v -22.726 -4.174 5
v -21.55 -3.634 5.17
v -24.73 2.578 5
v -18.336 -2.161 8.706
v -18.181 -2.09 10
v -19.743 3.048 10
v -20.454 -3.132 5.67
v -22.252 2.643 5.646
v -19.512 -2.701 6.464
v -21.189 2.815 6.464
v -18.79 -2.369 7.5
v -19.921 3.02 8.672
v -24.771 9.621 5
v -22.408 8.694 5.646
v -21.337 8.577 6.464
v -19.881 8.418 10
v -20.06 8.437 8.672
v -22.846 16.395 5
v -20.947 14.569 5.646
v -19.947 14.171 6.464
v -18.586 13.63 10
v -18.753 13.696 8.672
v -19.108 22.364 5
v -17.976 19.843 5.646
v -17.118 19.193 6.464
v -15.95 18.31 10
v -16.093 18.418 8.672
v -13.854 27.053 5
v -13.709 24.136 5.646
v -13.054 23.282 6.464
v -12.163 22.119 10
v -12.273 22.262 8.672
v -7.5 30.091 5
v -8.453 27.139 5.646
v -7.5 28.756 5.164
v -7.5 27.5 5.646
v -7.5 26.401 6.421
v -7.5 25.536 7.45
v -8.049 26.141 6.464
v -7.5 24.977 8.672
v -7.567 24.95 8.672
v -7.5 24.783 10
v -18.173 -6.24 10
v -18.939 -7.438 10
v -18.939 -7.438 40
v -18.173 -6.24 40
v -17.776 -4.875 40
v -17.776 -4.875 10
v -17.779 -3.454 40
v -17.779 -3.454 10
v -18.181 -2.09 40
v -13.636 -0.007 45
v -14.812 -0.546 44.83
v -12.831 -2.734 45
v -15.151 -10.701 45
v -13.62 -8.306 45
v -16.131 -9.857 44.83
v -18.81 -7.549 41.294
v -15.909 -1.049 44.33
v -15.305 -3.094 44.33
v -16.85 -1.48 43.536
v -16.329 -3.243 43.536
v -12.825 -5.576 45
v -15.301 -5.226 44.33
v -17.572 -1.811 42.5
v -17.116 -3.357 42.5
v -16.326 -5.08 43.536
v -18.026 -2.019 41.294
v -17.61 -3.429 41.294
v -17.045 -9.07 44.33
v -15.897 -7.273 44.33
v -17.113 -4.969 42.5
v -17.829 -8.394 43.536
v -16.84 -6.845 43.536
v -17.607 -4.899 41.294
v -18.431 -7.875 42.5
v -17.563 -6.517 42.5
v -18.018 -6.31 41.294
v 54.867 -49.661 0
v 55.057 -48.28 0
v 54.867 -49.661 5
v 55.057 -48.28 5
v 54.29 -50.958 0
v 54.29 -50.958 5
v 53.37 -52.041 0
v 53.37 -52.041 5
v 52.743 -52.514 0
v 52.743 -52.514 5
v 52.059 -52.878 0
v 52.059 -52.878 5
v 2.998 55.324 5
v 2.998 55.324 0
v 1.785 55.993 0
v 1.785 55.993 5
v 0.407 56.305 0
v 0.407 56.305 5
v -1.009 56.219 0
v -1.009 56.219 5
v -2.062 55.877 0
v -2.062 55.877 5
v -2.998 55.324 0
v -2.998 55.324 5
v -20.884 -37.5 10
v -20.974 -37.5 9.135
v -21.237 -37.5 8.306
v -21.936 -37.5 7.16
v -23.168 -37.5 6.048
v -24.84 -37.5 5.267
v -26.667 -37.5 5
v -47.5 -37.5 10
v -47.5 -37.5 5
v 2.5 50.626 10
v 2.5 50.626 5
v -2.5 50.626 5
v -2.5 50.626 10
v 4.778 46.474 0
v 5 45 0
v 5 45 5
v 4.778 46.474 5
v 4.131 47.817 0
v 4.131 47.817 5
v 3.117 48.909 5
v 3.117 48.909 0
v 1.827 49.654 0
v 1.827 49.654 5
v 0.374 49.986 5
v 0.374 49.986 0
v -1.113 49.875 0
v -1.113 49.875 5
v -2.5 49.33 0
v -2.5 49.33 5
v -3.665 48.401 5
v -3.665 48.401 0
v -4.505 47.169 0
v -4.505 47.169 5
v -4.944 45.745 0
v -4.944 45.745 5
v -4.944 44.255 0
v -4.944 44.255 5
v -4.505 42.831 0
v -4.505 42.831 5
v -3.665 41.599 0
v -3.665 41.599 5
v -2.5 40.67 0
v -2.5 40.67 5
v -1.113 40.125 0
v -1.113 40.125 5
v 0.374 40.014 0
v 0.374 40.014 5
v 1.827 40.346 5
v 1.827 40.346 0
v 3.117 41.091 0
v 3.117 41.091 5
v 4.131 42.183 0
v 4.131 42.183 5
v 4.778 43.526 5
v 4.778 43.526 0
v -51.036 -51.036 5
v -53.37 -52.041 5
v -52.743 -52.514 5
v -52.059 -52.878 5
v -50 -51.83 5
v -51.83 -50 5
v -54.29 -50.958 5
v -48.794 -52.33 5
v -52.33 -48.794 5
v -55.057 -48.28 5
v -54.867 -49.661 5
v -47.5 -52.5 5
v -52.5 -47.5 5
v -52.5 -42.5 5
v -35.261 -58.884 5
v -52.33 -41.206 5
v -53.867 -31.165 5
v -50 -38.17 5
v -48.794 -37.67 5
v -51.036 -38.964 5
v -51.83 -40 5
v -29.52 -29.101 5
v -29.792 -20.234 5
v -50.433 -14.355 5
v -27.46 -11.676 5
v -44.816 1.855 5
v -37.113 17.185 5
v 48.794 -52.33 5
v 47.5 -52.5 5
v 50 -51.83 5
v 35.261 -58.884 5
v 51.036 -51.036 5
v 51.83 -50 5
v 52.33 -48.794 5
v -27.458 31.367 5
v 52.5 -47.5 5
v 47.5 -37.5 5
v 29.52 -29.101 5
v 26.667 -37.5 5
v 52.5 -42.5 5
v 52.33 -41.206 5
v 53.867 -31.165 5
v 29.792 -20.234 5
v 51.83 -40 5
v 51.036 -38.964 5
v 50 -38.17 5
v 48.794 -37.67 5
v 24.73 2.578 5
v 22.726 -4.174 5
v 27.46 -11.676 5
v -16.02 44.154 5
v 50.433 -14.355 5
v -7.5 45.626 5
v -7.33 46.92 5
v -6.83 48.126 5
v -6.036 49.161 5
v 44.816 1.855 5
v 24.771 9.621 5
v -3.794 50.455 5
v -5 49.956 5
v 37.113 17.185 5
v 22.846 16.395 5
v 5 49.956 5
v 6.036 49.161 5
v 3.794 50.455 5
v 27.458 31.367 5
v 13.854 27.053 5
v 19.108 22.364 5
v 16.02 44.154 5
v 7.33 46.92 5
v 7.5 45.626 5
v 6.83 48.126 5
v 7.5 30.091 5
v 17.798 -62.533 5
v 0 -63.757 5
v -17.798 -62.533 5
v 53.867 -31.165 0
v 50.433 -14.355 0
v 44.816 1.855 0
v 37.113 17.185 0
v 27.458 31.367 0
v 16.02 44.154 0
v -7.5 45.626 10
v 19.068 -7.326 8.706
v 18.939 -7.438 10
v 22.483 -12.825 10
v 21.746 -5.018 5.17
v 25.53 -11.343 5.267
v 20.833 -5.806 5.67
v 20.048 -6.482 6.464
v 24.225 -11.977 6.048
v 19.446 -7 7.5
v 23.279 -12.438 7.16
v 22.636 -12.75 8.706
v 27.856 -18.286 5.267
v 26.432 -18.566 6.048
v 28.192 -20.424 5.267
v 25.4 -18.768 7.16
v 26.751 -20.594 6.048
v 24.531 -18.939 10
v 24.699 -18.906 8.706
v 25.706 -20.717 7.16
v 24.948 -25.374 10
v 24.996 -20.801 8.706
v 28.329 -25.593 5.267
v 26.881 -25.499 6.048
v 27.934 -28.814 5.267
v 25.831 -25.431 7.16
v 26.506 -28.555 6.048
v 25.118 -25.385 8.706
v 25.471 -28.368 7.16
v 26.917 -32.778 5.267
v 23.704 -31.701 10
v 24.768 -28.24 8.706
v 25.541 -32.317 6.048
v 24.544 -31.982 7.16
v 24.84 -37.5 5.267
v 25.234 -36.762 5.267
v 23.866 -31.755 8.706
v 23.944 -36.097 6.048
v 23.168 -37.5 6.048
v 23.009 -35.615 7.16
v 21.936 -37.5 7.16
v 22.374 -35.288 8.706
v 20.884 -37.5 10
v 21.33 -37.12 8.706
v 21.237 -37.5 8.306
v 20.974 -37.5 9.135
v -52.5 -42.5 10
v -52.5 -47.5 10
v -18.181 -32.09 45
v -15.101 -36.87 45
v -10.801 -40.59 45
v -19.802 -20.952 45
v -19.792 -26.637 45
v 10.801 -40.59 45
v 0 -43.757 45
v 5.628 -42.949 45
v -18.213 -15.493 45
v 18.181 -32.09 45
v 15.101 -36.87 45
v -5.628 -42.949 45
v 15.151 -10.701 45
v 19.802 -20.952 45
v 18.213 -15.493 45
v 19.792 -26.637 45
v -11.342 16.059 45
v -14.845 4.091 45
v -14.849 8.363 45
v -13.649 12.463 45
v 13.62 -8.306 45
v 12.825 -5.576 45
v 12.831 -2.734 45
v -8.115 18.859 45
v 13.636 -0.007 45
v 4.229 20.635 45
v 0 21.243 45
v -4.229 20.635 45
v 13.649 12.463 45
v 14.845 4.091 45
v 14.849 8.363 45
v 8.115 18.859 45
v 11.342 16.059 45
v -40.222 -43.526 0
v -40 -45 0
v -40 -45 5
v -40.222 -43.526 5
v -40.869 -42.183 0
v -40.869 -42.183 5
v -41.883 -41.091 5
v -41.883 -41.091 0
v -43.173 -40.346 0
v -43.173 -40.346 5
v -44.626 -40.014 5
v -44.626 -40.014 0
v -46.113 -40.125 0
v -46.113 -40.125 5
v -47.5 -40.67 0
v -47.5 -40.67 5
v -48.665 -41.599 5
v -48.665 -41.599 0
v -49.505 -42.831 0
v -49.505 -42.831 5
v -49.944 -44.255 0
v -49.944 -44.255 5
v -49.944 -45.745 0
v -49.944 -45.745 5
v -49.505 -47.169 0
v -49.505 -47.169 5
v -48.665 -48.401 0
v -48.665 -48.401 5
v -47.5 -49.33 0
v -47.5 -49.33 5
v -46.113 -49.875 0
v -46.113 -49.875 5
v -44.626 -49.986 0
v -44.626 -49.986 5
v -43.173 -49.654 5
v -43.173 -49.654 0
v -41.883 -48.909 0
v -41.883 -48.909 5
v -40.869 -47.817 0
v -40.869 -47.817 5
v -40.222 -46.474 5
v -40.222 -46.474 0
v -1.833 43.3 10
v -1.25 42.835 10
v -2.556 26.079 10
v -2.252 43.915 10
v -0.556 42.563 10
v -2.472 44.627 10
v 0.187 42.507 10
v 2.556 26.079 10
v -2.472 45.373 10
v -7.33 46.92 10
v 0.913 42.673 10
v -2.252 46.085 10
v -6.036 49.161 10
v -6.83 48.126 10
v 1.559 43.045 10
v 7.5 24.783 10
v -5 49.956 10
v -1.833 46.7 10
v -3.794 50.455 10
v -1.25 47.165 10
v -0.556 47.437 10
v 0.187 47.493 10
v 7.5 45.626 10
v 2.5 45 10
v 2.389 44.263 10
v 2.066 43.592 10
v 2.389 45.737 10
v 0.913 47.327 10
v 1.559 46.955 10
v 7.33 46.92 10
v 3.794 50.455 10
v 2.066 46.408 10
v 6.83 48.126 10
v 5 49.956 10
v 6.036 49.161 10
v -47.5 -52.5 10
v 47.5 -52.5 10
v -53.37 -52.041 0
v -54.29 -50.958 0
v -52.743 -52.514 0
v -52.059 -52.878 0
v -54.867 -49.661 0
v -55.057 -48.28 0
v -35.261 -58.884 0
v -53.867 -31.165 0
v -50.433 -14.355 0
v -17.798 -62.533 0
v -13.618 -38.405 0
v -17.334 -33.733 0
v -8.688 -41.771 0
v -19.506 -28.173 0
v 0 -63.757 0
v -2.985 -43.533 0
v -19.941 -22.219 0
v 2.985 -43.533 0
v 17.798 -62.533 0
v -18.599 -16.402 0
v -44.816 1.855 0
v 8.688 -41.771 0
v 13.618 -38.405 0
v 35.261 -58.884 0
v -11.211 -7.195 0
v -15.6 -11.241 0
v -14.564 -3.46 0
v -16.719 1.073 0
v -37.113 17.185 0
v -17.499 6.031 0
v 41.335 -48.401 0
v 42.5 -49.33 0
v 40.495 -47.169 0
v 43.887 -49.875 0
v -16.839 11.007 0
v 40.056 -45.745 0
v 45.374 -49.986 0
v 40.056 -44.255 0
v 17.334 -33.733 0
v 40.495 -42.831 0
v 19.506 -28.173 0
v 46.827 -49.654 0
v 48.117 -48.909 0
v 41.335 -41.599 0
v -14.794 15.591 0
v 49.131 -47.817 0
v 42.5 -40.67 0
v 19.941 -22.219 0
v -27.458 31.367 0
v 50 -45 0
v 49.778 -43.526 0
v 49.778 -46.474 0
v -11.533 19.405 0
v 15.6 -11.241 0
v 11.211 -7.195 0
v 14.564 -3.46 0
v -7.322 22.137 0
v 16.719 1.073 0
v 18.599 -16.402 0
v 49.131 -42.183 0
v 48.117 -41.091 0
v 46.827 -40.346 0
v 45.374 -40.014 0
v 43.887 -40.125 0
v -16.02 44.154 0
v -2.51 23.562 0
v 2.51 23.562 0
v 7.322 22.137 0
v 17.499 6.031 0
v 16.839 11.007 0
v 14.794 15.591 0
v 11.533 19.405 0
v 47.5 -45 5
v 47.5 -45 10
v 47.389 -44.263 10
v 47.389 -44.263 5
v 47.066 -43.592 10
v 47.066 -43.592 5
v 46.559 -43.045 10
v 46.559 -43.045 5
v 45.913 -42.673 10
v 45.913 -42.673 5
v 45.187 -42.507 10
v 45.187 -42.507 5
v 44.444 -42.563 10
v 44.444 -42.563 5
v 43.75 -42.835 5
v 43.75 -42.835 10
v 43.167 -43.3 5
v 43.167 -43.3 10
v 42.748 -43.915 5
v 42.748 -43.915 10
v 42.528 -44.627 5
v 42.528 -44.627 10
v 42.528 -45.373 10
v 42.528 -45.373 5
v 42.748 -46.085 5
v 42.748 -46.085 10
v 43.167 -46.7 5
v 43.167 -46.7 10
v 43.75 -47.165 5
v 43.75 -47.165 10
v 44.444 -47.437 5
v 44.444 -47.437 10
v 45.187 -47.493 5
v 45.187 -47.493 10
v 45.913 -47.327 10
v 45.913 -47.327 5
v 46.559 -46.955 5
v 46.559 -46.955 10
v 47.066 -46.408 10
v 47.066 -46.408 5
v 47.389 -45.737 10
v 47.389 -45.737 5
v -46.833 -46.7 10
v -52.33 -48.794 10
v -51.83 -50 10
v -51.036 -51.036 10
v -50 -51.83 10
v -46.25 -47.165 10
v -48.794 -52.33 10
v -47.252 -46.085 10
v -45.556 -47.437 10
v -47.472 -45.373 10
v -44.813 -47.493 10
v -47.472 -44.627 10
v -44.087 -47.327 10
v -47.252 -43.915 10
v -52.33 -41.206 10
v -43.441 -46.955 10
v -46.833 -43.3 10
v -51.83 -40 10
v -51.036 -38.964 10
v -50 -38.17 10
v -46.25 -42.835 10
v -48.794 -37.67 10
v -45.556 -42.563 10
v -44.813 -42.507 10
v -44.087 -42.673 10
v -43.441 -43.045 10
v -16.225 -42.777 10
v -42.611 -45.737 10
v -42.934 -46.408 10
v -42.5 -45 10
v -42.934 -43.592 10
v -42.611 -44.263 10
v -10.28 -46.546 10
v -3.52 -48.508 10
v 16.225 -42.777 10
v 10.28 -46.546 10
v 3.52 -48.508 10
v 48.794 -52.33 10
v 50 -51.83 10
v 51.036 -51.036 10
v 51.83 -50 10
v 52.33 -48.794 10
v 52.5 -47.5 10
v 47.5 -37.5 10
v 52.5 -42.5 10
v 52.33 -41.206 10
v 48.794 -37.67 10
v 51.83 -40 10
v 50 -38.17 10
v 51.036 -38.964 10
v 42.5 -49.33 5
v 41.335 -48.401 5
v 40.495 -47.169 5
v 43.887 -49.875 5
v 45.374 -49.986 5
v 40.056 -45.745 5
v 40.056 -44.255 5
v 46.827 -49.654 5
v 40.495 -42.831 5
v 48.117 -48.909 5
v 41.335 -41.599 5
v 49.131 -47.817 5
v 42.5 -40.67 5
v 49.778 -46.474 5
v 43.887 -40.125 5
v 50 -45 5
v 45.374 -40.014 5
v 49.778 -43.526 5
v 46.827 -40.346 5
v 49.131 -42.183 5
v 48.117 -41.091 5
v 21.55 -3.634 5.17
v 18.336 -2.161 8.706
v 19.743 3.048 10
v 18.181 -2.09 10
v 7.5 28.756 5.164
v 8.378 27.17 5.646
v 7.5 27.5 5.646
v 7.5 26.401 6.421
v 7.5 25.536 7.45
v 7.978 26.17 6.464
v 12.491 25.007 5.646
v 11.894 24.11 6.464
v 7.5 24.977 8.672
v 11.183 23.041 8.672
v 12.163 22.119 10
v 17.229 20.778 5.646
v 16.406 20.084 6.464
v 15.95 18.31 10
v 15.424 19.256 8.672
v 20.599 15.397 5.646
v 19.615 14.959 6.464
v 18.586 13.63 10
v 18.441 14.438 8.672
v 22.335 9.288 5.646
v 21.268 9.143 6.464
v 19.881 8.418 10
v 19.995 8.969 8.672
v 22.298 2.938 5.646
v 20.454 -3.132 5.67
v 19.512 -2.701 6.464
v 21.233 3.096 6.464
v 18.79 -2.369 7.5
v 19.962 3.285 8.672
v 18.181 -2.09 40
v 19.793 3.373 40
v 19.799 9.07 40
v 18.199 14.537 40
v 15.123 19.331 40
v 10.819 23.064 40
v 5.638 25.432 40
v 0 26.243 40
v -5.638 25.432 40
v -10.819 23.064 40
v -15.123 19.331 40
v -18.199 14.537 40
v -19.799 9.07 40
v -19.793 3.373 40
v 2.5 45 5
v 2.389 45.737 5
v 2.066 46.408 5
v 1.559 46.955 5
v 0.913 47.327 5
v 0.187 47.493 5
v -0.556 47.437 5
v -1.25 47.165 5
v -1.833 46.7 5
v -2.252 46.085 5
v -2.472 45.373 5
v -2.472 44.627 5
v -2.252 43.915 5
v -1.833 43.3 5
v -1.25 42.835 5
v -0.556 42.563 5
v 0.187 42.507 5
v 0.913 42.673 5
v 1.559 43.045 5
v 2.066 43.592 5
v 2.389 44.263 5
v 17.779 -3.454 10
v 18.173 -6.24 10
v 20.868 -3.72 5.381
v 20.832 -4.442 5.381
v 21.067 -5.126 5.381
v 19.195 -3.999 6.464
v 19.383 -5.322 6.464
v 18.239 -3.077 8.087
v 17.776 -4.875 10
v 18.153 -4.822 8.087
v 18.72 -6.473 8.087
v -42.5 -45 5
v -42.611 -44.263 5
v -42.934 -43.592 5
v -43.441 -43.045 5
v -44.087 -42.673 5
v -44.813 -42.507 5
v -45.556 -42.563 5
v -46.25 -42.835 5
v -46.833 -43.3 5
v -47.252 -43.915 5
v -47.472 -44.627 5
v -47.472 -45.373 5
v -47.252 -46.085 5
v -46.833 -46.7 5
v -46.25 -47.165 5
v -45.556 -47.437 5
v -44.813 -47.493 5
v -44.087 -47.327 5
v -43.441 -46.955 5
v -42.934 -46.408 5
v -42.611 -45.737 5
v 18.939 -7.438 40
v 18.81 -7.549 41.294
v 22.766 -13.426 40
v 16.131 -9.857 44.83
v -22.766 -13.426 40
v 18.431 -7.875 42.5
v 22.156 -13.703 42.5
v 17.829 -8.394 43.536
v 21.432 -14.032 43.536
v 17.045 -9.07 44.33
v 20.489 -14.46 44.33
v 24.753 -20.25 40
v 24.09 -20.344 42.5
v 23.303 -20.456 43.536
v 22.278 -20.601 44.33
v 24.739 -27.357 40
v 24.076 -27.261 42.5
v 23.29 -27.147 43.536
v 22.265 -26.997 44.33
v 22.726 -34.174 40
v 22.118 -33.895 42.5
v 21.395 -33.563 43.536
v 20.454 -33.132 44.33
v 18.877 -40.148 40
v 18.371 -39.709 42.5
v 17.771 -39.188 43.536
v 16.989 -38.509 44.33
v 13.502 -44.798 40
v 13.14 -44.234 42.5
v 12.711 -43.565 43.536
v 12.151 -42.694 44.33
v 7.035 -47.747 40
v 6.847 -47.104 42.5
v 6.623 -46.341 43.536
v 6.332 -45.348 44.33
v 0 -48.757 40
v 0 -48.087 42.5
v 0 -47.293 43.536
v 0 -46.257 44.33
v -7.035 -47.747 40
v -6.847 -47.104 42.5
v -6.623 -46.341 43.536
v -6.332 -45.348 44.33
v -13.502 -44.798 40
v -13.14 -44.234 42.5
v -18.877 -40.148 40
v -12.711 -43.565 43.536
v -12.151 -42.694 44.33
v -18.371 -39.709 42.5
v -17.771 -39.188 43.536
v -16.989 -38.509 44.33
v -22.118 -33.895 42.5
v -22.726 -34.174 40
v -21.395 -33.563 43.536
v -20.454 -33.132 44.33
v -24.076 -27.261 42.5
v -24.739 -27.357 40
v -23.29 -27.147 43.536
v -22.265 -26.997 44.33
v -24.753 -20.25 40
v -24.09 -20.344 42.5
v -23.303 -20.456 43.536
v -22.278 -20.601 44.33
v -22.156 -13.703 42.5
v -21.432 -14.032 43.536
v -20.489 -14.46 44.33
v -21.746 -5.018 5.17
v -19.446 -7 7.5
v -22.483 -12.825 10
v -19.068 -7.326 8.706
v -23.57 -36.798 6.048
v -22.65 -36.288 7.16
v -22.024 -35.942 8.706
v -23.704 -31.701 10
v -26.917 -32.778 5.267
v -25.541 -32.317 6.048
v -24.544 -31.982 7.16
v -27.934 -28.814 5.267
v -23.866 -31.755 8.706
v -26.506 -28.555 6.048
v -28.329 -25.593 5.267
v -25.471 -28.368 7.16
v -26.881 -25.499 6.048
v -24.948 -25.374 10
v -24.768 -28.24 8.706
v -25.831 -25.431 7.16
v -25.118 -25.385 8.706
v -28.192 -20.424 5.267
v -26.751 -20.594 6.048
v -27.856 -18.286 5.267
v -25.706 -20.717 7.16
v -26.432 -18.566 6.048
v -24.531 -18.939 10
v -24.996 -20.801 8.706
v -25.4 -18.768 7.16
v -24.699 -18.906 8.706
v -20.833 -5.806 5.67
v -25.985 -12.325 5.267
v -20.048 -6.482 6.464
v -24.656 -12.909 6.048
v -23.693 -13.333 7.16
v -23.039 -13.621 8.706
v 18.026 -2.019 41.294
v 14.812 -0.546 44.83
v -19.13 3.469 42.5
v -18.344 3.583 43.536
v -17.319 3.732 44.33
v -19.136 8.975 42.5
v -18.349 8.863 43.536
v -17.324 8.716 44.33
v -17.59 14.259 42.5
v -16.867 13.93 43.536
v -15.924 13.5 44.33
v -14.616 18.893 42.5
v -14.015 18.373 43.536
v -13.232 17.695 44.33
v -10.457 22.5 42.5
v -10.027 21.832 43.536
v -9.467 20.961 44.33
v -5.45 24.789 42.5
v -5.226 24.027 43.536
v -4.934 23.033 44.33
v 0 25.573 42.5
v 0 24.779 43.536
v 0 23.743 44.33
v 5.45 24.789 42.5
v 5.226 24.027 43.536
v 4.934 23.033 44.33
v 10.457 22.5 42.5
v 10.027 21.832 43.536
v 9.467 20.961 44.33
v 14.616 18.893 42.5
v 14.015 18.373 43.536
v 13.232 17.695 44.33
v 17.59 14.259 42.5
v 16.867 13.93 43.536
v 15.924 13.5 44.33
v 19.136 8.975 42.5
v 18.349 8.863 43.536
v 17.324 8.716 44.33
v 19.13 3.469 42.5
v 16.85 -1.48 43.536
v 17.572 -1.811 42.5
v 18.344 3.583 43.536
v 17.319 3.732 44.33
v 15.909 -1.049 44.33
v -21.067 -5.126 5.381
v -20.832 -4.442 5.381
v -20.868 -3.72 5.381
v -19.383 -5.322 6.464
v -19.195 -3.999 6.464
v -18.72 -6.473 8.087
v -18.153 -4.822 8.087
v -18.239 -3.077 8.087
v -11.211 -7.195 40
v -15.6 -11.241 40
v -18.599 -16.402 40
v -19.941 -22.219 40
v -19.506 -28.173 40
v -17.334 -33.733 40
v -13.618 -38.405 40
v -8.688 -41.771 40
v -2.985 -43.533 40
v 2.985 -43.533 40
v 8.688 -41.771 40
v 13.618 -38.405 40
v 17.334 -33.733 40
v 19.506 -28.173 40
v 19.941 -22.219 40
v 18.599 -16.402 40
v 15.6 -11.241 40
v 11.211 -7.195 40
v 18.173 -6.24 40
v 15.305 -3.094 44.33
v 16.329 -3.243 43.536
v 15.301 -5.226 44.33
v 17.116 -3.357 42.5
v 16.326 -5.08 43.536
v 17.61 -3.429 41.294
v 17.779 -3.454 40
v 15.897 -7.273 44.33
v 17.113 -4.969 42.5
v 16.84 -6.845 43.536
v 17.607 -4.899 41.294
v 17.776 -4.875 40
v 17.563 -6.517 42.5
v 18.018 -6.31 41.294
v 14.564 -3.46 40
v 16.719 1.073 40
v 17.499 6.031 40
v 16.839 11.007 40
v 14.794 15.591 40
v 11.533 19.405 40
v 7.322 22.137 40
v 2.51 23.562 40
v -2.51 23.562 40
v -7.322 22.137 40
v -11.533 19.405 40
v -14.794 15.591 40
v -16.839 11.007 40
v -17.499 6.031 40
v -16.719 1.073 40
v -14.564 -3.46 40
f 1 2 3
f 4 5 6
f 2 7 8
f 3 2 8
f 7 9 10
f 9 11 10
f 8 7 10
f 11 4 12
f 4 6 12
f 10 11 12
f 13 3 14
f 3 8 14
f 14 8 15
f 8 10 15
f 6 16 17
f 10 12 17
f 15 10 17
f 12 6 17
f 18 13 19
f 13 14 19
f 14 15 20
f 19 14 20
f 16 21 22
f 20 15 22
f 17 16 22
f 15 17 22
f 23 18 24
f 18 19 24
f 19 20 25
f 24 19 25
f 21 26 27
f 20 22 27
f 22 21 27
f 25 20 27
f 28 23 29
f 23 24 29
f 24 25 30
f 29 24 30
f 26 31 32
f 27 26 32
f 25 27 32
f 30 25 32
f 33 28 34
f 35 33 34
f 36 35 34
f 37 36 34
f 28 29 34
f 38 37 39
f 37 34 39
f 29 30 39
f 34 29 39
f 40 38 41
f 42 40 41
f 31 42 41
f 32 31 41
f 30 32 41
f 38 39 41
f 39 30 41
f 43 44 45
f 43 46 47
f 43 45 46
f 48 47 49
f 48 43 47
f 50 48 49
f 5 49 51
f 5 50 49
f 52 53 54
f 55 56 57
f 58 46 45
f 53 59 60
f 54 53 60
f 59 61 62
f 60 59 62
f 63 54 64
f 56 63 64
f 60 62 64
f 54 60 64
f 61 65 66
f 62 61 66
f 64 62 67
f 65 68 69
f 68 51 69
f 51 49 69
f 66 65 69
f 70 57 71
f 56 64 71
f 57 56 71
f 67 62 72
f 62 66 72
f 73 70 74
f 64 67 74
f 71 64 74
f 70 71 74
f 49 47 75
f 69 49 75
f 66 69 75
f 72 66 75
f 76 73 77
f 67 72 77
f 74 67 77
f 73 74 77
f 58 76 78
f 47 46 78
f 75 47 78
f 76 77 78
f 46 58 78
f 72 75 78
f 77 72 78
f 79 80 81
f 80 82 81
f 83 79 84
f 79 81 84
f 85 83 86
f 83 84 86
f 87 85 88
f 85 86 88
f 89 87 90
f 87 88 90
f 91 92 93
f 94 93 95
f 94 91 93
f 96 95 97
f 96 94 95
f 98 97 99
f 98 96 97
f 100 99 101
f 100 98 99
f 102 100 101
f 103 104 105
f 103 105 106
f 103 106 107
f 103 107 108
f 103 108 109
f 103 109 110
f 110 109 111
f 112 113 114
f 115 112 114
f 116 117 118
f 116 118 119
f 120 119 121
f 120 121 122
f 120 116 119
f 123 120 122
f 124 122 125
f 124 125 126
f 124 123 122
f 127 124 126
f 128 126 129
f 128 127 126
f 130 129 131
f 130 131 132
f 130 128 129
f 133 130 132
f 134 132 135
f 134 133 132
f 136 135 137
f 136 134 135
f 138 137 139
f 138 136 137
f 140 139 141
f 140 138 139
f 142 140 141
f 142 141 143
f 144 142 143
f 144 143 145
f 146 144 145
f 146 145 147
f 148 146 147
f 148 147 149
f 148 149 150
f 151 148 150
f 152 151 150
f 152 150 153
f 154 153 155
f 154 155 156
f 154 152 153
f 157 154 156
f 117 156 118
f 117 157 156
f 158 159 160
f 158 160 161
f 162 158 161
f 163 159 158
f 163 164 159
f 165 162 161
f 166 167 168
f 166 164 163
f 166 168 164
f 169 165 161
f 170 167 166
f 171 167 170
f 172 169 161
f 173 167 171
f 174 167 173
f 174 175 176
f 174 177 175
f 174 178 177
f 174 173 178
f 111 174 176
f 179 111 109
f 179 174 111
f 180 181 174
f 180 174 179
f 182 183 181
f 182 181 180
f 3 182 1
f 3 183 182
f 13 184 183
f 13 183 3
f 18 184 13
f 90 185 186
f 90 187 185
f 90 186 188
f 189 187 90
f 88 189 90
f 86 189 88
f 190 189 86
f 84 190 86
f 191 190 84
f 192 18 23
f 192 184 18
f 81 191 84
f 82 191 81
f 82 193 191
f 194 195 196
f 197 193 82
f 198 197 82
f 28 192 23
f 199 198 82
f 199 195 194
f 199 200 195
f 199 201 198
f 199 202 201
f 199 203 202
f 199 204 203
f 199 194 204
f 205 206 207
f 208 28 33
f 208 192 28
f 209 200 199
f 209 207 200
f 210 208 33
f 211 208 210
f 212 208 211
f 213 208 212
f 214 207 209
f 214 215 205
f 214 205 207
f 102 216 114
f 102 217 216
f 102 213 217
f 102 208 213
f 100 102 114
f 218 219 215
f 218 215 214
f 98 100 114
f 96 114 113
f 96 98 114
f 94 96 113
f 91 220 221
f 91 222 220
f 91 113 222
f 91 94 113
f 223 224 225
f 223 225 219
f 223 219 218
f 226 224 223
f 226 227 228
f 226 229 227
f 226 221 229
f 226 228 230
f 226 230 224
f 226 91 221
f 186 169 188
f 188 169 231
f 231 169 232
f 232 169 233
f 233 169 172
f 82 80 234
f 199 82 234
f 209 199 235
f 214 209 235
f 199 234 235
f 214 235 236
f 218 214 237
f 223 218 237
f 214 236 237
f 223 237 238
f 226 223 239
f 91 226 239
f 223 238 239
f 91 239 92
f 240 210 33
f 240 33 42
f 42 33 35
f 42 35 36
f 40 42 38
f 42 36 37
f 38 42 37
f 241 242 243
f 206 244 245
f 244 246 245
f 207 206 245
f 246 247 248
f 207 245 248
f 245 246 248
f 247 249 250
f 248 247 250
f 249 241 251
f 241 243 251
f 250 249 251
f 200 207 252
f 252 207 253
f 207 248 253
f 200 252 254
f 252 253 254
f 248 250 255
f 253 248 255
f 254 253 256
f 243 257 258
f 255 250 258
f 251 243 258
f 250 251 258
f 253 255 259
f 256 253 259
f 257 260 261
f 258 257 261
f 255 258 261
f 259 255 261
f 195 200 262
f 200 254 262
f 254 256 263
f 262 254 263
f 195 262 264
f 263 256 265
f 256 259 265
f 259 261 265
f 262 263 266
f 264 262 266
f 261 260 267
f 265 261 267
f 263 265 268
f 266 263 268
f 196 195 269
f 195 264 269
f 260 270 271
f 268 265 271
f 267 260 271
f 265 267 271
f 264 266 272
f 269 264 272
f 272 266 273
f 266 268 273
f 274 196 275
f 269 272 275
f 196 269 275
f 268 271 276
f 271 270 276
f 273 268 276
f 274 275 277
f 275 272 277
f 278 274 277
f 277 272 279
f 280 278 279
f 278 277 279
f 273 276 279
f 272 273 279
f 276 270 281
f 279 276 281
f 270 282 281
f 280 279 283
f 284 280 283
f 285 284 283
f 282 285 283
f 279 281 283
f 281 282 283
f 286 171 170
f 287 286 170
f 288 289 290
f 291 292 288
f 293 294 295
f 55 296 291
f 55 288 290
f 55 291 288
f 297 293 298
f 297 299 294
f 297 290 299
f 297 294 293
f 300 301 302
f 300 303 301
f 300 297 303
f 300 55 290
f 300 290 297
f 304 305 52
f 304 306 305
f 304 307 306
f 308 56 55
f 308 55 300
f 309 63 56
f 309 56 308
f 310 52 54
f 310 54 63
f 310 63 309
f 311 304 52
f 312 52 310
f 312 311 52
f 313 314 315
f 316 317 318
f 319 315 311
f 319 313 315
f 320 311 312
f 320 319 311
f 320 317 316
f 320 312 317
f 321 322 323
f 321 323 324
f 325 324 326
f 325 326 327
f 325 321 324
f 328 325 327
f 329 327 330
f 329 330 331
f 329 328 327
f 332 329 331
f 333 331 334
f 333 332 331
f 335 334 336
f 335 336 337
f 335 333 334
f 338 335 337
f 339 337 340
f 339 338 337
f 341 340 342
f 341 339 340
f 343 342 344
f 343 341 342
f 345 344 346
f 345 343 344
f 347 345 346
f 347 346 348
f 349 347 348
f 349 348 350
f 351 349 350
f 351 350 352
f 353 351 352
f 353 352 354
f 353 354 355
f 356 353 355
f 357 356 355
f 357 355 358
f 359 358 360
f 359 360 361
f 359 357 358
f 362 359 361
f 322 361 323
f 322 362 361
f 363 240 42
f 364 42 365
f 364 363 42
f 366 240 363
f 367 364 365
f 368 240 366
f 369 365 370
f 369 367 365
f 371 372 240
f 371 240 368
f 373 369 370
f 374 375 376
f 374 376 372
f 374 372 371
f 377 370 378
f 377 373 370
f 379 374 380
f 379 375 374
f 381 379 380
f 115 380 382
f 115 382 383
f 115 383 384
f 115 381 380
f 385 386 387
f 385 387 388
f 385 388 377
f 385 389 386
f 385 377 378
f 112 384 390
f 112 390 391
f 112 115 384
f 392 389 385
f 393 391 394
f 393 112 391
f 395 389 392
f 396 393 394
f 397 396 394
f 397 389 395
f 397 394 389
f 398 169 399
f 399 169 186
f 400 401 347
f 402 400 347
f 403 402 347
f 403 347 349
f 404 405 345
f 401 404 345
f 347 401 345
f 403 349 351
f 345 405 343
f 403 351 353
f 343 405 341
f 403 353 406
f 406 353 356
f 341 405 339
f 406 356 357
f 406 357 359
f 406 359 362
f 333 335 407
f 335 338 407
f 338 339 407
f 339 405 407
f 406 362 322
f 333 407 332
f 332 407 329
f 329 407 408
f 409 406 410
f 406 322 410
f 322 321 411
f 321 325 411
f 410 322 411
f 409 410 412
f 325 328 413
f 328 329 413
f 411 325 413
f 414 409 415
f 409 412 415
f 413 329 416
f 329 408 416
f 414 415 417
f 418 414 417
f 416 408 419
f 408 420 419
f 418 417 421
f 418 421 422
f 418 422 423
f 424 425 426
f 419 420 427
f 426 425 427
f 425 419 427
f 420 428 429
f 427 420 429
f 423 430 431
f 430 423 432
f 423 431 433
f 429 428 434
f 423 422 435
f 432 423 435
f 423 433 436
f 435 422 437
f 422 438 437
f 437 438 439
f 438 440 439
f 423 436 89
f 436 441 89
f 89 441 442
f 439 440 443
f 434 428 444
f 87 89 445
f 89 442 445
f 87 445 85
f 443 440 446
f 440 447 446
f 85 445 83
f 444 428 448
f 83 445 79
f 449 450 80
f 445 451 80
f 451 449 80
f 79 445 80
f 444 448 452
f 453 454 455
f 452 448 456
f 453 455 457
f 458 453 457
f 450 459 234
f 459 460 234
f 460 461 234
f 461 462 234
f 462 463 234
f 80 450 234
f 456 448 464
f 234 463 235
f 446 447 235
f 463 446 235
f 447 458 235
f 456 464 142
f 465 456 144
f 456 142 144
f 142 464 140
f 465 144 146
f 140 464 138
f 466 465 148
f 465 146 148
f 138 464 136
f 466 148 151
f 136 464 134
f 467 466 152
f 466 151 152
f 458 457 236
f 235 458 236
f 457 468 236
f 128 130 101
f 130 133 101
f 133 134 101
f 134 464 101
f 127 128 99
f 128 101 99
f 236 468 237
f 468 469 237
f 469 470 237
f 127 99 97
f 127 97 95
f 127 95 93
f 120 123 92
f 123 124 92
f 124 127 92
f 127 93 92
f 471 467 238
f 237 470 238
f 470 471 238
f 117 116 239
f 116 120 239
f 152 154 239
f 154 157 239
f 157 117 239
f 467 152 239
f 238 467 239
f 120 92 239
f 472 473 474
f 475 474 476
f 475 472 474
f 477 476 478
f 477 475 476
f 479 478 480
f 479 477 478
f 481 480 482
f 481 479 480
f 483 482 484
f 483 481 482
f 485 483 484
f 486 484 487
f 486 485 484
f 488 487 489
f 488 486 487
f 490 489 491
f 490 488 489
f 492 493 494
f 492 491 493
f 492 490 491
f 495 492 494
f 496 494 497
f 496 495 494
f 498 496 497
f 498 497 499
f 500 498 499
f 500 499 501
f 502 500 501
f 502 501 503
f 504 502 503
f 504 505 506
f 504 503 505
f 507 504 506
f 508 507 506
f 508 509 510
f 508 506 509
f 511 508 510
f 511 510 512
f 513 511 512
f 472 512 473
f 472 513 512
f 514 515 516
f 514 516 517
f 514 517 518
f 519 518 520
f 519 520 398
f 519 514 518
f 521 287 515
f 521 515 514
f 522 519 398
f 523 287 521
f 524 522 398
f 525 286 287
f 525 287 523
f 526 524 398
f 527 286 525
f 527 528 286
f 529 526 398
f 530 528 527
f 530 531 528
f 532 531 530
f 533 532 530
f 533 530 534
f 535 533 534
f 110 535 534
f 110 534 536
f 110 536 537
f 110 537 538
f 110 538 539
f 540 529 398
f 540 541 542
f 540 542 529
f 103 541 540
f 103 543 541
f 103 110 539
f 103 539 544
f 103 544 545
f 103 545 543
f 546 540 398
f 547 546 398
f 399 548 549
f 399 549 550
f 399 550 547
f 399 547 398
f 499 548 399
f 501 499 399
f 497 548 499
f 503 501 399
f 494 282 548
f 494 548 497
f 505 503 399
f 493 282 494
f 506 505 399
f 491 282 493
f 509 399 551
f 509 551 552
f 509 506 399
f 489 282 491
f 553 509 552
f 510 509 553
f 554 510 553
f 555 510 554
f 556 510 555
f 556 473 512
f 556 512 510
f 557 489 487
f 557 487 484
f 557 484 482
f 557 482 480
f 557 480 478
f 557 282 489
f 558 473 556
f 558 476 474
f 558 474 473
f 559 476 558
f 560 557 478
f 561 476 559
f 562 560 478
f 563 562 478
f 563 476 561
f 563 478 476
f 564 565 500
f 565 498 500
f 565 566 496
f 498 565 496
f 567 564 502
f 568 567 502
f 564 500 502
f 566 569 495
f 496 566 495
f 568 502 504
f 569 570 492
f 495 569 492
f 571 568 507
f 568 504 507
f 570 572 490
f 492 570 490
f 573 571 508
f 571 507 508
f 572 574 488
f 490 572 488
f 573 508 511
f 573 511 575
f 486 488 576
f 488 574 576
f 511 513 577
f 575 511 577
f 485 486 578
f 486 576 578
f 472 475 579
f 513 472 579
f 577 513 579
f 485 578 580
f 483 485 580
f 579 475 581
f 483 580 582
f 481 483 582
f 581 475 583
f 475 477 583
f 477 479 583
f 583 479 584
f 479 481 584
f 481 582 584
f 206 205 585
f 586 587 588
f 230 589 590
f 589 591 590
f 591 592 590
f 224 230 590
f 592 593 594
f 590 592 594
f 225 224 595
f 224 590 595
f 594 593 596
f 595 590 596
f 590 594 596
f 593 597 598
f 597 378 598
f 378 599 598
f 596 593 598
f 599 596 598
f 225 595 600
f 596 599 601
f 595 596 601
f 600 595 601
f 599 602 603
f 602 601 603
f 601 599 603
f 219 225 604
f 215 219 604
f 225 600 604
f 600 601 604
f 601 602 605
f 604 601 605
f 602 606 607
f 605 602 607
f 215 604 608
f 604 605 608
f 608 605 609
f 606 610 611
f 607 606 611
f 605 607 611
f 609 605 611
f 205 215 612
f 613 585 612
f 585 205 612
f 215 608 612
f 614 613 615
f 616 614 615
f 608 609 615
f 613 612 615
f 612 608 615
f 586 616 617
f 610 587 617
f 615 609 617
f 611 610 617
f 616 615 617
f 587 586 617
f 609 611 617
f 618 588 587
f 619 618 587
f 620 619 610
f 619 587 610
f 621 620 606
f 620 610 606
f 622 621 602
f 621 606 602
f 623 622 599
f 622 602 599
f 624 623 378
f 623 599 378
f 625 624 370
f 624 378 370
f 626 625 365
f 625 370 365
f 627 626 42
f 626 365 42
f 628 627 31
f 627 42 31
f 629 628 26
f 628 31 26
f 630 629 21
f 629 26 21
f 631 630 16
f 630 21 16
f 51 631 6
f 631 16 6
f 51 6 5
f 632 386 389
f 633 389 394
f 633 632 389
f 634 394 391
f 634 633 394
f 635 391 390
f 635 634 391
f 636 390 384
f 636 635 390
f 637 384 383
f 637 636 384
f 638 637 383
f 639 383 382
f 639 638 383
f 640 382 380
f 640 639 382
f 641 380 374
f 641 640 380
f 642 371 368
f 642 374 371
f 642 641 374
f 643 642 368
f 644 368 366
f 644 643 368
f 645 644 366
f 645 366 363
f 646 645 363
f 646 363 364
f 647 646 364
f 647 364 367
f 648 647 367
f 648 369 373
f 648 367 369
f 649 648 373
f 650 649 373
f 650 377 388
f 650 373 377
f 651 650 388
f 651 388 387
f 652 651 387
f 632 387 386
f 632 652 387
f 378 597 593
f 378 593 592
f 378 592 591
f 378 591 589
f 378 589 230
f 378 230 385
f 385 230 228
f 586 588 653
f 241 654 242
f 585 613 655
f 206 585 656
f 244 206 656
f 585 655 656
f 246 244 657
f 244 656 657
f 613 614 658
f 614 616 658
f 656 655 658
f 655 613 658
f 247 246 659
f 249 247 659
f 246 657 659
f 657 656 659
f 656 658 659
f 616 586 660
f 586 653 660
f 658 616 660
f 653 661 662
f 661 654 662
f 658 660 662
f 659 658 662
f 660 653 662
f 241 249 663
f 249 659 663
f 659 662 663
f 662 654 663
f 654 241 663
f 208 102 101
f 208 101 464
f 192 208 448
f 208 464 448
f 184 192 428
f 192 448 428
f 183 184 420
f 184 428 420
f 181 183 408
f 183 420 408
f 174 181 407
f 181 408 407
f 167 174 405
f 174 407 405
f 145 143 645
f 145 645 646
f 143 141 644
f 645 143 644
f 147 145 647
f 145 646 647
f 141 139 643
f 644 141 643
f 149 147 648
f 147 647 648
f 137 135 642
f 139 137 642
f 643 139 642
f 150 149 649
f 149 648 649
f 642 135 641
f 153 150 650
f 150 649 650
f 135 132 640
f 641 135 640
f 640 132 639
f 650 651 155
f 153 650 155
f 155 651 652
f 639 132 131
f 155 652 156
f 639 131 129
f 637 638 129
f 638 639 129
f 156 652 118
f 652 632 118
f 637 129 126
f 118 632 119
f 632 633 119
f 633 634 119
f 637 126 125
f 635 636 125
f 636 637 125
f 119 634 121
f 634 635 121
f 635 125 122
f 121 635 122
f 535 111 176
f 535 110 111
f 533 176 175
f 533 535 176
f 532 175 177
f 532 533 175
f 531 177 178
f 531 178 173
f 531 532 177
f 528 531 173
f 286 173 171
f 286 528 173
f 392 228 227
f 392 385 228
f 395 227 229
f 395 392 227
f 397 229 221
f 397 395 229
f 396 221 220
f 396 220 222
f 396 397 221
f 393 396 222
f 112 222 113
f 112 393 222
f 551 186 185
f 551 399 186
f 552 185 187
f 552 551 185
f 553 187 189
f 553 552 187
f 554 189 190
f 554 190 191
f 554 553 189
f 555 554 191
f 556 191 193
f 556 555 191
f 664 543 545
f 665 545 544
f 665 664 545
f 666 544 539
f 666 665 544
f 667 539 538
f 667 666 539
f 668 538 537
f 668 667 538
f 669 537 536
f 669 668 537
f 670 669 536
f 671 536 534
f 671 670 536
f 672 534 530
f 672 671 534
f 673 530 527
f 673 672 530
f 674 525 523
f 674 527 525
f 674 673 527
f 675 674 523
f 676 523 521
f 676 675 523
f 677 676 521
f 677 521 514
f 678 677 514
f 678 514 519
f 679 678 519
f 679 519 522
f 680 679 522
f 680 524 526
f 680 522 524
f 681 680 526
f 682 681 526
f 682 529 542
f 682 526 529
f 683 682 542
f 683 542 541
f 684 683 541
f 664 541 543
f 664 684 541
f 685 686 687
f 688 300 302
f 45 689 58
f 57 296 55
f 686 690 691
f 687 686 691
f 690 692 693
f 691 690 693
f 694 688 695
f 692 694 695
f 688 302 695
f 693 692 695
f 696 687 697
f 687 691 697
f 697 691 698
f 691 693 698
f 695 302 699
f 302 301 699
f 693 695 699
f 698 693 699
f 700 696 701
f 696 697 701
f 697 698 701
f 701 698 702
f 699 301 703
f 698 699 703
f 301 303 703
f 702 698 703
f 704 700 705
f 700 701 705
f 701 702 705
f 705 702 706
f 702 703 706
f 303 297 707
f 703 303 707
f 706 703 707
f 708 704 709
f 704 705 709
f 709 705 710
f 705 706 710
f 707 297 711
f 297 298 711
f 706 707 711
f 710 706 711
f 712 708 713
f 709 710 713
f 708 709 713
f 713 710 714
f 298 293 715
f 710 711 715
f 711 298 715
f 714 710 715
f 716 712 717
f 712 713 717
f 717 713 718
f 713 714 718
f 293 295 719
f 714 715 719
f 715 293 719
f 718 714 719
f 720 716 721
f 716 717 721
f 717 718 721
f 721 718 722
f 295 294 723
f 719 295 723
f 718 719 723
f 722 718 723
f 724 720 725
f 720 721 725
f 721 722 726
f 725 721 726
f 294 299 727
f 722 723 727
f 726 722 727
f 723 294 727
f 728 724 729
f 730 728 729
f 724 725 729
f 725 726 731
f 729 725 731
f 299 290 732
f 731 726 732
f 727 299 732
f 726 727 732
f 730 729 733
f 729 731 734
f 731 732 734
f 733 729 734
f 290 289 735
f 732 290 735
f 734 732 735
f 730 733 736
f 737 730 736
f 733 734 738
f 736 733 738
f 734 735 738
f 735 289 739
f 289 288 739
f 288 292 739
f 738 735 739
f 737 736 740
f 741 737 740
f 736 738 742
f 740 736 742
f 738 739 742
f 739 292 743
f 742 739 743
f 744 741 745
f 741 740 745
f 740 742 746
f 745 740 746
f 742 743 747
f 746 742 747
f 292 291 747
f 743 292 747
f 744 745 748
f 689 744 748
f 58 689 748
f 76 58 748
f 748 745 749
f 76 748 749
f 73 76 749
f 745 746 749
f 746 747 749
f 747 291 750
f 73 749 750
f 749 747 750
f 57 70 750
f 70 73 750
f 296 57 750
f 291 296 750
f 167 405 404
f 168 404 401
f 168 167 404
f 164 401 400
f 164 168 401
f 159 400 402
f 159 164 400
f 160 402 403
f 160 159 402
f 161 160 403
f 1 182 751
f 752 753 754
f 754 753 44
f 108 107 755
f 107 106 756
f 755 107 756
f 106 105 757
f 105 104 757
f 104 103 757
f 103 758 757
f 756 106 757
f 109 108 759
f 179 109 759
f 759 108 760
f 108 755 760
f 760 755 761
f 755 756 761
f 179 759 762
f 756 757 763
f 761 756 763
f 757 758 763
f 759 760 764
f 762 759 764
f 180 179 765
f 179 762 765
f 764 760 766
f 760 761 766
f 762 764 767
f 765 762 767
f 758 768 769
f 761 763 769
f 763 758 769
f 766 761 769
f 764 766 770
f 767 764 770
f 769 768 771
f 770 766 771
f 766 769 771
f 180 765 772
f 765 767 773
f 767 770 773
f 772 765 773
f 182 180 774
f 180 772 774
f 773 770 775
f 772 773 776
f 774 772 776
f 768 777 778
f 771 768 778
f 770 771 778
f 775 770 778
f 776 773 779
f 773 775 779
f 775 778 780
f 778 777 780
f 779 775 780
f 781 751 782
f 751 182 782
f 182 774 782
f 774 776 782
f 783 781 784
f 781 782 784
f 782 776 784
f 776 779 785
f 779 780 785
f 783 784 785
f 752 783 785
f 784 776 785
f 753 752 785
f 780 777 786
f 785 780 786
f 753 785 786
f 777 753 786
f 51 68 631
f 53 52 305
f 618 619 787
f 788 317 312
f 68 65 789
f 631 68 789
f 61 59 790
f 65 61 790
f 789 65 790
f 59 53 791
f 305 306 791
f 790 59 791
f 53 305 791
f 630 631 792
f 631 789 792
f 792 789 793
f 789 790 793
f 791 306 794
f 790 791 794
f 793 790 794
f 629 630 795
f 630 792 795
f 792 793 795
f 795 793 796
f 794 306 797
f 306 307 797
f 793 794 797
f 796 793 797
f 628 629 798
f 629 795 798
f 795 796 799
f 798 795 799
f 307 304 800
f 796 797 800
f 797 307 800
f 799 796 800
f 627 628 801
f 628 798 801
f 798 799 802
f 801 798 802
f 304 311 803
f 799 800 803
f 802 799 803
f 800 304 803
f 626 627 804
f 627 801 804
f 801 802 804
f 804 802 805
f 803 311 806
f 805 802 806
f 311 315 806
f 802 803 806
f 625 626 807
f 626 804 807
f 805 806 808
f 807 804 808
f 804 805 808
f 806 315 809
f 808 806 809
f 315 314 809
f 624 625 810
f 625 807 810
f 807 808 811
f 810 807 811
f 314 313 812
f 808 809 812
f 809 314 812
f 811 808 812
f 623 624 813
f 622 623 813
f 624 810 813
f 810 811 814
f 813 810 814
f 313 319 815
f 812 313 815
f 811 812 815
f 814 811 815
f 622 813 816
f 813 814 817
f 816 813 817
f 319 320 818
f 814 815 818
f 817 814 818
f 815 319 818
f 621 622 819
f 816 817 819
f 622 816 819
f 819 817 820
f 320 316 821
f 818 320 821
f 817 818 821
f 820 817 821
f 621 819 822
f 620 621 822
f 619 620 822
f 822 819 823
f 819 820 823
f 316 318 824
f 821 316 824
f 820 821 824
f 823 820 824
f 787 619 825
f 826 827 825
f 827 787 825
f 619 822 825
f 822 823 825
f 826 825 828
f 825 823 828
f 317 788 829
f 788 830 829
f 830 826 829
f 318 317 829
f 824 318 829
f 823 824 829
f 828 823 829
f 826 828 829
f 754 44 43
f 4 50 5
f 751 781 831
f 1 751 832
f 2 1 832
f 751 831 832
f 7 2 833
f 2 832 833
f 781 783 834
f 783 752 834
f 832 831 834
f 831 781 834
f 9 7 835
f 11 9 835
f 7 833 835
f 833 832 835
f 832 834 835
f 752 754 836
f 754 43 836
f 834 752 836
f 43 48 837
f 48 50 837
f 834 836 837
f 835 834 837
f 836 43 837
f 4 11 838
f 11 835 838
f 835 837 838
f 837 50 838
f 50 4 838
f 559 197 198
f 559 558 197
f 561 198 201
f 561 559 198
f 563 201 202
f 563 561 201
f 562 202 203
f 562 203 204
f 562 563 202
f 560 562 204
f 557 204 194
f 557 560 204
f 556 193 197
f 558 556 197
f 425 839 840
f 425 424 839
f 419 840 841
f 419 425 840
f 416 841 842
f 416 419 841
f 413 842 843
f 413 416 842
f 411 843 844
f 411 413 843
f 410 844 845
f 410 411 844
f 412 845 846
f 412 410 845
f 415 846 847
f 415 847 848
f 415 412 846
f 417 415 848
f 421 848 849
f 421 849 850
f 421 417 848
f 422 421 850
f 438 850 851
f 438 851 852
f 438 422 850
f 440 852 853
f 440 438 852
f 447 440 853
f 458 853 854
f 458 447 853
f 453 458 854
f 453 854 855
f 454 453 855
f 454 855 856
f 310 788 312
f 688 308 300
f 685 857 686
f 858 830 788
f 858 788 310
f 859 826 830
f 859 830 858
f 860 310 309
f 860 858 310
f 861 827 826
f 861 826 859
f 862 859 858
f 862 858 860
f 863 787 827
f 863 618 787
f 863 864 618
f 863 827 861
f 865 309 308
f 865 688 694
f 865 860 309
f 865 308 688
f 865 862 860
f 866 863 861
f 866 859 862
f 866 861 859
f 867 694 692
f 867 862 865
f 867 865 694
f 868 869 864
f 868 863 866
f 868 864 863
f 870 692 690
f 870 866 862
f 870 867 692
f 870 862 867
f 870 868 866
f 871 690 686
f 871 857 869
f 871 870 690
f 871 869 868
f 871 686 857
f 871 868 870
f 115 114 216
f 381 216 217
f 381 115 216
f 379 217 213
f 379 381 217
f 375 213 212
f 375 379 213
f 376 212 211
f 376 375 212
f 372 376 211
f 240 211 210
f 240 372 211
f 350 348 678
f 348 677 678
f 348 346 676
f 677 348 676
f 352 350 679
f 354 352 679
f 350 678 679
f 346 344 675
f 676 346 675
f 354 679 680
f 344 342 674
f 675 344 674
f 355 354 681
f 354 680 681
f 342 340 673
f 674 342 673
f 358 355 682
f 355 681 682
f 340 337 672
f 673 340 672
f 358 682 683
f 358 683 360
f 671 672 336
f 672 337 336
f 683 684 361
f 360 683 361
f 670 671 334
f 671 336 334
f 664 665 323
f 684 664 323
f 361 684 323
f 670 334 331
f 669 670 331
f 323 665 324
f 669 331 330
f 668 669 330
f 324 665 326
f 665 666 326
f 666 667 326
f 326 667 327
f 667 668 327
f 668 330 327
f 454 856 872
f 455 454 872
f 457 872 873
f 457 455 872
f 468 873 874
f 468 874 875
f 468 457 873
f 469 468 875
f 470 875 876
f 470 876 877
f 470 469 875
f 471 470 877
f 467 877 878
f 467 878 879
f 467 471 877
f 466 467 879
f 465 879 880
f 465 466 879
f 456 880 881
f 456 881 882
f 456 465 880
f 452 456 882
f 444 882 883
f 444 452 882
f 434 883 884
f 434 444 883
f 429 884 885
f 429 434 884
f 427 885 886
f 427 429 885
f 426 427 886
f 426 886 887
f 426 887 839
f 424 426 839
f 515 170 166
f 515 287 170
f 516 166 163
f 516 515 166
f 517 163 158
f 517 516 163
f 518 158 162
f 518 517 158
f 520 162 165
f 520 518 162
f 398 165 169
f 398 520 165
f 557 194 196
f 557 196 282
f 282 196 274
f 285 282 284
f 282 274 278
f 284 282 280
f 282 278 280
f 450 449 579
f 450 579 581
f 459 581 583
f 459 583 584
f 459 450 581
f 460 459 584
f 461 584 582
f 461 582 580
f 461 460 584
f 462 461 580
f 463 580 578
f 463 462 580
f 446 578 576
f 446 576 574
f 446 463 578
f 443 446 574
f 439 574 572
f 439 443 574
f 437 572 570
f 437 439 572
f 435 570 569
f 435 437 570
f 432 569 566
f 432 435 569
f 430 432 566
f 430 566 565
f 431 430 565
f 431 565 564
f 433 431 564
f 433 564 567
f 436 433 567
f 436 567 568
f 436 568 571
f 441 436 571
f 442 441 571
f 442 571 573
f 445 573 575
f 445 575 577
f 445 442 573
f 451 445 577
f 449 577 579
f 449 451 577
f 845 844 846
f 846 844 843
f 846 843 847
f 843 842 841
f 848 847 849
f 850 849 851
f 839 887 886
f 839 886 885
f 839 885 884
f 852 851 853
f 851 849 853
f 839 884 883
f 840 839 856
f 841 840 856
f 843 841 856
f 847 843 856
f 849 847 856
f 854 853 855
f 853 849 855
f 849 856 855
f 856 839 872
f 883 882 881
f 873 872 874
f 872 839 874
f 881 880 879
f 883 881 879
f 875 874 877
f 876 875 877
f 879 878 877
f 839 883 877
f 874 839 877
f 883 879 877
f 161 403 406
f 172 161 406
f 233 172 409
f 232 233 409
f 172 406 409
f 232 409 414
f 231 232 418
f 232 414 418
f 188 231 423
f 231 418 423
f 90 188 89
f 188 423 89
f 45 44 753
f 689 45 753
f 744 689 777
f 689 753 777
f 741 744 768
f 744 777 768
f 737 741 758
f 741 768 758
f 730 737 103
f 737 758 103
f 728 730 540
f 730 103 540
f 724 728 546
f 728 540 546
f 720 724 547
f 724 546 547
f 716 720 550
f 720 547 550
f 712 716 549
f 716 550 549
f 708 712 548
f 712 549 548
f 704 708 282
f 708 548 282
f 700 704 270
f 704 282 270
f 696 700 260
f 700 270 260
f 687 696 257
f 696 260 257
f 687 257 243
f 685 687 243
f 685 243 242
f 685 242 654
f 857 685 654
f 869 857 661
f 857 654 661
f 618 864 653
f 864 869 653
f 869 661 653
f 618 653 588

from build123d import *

# Parameters (mm, degrees)
F5_DEPTH  = 5
F3_R      = 20
F2_R      = 25
F2_R_2    = 20
F6_DEPTH  = 50
F7_DEPTH  = 10
F0_R      = 5
F0_R_2    = 2.5
F8_DEPTH  = 5
F9_DEPTH  = 25
F10_R     = 17.5
F11_DEPTH = 40
F12_DEPTH = 5
F13_R     = 5
F14_R     = 5


with BuildPart() as f5:
    # F1 (on Top) → F5 (new body)
    with BuildSketch(Plane.XY):
        with BuildLine():
            ThreePointArc((55.0272203653, -51.5364989145), (41.1164714576, 9.8481618987), (0, 57.5033955377))
            ThreePointArc((0, 57.5033955377), (-41.1164714576, 9.8481618987), (-55.0272203653, -51.5364989145))
            ThreePointArc((-55.0272203653, -51.5364989145), (0, -63.7570226936), (55.0272203653, -51.5364989145))
        make_face()
        with BuildLine():
            ThreePointArc((-45, -45), (-32.3889723065, 4.9444861533), (0, 45))
            ThreePointArc((0, 45), (32.3889723065, 4.9444861533), (45, -45))
            ThreePointArc((45, -45), (0, -53.7570226936), (-45, -45))
        make_face(mode=Mode.SUBTRACT)
        with BuildLine():
            ThreePointArc((45, -45), (32.3889723065, 4.9444861533), (0, 45))
            ThreePointArc((0, 45), (-32.3889723065, 4.9444861533), (-45, -45))
            ThreePointArc((-45, -45), (0, -53.7570226936), (45, -45))
        make_face()
    extrude(amount=F5_DEPTH)

    # F3 (on Top) + F2 (on Top) → F6 (join)
    with BuildSketch(Plane.XY):
        with Locations((0, 6.2429773064)):
            Circle(F3_R)
    with BuildSketch(Plane.XY):
        with Locations((0, -23.7570226936)):
            Circle(F2_R)
        with Locations((0, -23.7570226936)):
            Circle(F2_R_2, mode=Mode.SUBTRACT)
        with Locations((0, -23.7570226936)):
            Circle(F2_R_2)
    extrude(amount=F6_DEPTH)

    # F4 (on Top) → F7 (join)
    with BuildSketch(Plane.XY):
        Polygon((52.5, -37.5), (0, -37.5), (-52.5, -37.5), (-52.5, -52.5), (52.5, -52.5), align=None)
        Polygon((-7.5, 10.6258387864), (0, 10.6258387864), (7.5, 10.6258387864), (7.5, 50.6258387864), (-7.5, 50.6258387864), align=None)
    extrude(amount=F7_DEPTH)

    # F0 (on Top) → F8 (cut)
    with BuildSketch(Plane.XY):
        with Locations((-45, -45)):
            Circle(F0_R)
        with Locations((-45, -45)):
            Circle(F0_R_2, mode=Mode.SUBTRACT)
        with Locations((0, 45)):
            Circle(F0_R)
        with Locations((0, 45)):
            Circle(F0_R_2, mode=Mode.SUBTRACT)
        with Locations((45, -45)):
            Circle(F0_R)
        with Locations((45, -45)):
            Circle(F0_R_2, mode=Mode.SUBTRACT)
    extrude(amount=F8_DEPTH, mode=Mode.SUBTRACT)

    # F0 (on Top) → F9 (cut)
    with BuildSketch(Plane.XY):
        with Locations((-45, -45)):
            Circle(F0_R_2)
        with Locations((0, 45)):
            Circle(F0_R_2)
        with Locations((45, -45)):
            Circle(F0_R_2)
    extrude(amount=F9_DEPTH, mode=Mode.SUBTRACT)

    # F10 (on face) + F2 (on Top) → F11 (cut)
    with BuildSketch(Plane.XY):
        with Locations((0, 6.2429773064)):
            Circle(F10_R)
    with BuildSketch(Plane.XY):
        with Locations((0, -23.7570226936)):
            Circle(F2_R_2)
    extrude(amount=F11_DEPTH, mode=Mode.SUBTRACT)

    # F12 (cut): a face of the model
    f12_faces = [f5.faces().sort_by_distance(p)[0] for p in [
        (0, -12.7665147671, 50),
    ]]
    extrude(f12_faces, amount=-F12_DEPTH, mode=Mode.SUBTRACT)

    # F13
    f13_edges = [f5.edges().sort_by_distance(p)[0] for p in [
        (52.5, -52.5, 7.5),
        (52.5, -37.5, 7.5),
        (55.02722, -51.536499, 2.5),
        (-55.02722, -51.536499, 2.5),
        (-52.5, -52.5, 7.5),
        (-52.5, -37.5, 7.5),
        (-7.5, 50.625839, 7.5),
        (0, 57.503396, 2.5),
        (7.5, 50.625839, 7.5),
    ]]
    fillet(f13_edges, radius=F13_R)

    # F14
    f14_edges = [f5.edges().sort_by_distance(p)[0] for p in [
        (19.138968, 12.04814, 5),
        (-24.779157, -20.441394, 5),
        (24.779157, -20.441394, 5),
        (-19.138968, 12.04814, 5),
        (-16.535946, -5.007023, 25),
        (16.535946, -5.007023, 25),
        (0, 26.242977, 45),
        (0, -48.757023, 45),
    ]]
    fillet(f14_edges, radius=F14_R)


solid = f5.part
